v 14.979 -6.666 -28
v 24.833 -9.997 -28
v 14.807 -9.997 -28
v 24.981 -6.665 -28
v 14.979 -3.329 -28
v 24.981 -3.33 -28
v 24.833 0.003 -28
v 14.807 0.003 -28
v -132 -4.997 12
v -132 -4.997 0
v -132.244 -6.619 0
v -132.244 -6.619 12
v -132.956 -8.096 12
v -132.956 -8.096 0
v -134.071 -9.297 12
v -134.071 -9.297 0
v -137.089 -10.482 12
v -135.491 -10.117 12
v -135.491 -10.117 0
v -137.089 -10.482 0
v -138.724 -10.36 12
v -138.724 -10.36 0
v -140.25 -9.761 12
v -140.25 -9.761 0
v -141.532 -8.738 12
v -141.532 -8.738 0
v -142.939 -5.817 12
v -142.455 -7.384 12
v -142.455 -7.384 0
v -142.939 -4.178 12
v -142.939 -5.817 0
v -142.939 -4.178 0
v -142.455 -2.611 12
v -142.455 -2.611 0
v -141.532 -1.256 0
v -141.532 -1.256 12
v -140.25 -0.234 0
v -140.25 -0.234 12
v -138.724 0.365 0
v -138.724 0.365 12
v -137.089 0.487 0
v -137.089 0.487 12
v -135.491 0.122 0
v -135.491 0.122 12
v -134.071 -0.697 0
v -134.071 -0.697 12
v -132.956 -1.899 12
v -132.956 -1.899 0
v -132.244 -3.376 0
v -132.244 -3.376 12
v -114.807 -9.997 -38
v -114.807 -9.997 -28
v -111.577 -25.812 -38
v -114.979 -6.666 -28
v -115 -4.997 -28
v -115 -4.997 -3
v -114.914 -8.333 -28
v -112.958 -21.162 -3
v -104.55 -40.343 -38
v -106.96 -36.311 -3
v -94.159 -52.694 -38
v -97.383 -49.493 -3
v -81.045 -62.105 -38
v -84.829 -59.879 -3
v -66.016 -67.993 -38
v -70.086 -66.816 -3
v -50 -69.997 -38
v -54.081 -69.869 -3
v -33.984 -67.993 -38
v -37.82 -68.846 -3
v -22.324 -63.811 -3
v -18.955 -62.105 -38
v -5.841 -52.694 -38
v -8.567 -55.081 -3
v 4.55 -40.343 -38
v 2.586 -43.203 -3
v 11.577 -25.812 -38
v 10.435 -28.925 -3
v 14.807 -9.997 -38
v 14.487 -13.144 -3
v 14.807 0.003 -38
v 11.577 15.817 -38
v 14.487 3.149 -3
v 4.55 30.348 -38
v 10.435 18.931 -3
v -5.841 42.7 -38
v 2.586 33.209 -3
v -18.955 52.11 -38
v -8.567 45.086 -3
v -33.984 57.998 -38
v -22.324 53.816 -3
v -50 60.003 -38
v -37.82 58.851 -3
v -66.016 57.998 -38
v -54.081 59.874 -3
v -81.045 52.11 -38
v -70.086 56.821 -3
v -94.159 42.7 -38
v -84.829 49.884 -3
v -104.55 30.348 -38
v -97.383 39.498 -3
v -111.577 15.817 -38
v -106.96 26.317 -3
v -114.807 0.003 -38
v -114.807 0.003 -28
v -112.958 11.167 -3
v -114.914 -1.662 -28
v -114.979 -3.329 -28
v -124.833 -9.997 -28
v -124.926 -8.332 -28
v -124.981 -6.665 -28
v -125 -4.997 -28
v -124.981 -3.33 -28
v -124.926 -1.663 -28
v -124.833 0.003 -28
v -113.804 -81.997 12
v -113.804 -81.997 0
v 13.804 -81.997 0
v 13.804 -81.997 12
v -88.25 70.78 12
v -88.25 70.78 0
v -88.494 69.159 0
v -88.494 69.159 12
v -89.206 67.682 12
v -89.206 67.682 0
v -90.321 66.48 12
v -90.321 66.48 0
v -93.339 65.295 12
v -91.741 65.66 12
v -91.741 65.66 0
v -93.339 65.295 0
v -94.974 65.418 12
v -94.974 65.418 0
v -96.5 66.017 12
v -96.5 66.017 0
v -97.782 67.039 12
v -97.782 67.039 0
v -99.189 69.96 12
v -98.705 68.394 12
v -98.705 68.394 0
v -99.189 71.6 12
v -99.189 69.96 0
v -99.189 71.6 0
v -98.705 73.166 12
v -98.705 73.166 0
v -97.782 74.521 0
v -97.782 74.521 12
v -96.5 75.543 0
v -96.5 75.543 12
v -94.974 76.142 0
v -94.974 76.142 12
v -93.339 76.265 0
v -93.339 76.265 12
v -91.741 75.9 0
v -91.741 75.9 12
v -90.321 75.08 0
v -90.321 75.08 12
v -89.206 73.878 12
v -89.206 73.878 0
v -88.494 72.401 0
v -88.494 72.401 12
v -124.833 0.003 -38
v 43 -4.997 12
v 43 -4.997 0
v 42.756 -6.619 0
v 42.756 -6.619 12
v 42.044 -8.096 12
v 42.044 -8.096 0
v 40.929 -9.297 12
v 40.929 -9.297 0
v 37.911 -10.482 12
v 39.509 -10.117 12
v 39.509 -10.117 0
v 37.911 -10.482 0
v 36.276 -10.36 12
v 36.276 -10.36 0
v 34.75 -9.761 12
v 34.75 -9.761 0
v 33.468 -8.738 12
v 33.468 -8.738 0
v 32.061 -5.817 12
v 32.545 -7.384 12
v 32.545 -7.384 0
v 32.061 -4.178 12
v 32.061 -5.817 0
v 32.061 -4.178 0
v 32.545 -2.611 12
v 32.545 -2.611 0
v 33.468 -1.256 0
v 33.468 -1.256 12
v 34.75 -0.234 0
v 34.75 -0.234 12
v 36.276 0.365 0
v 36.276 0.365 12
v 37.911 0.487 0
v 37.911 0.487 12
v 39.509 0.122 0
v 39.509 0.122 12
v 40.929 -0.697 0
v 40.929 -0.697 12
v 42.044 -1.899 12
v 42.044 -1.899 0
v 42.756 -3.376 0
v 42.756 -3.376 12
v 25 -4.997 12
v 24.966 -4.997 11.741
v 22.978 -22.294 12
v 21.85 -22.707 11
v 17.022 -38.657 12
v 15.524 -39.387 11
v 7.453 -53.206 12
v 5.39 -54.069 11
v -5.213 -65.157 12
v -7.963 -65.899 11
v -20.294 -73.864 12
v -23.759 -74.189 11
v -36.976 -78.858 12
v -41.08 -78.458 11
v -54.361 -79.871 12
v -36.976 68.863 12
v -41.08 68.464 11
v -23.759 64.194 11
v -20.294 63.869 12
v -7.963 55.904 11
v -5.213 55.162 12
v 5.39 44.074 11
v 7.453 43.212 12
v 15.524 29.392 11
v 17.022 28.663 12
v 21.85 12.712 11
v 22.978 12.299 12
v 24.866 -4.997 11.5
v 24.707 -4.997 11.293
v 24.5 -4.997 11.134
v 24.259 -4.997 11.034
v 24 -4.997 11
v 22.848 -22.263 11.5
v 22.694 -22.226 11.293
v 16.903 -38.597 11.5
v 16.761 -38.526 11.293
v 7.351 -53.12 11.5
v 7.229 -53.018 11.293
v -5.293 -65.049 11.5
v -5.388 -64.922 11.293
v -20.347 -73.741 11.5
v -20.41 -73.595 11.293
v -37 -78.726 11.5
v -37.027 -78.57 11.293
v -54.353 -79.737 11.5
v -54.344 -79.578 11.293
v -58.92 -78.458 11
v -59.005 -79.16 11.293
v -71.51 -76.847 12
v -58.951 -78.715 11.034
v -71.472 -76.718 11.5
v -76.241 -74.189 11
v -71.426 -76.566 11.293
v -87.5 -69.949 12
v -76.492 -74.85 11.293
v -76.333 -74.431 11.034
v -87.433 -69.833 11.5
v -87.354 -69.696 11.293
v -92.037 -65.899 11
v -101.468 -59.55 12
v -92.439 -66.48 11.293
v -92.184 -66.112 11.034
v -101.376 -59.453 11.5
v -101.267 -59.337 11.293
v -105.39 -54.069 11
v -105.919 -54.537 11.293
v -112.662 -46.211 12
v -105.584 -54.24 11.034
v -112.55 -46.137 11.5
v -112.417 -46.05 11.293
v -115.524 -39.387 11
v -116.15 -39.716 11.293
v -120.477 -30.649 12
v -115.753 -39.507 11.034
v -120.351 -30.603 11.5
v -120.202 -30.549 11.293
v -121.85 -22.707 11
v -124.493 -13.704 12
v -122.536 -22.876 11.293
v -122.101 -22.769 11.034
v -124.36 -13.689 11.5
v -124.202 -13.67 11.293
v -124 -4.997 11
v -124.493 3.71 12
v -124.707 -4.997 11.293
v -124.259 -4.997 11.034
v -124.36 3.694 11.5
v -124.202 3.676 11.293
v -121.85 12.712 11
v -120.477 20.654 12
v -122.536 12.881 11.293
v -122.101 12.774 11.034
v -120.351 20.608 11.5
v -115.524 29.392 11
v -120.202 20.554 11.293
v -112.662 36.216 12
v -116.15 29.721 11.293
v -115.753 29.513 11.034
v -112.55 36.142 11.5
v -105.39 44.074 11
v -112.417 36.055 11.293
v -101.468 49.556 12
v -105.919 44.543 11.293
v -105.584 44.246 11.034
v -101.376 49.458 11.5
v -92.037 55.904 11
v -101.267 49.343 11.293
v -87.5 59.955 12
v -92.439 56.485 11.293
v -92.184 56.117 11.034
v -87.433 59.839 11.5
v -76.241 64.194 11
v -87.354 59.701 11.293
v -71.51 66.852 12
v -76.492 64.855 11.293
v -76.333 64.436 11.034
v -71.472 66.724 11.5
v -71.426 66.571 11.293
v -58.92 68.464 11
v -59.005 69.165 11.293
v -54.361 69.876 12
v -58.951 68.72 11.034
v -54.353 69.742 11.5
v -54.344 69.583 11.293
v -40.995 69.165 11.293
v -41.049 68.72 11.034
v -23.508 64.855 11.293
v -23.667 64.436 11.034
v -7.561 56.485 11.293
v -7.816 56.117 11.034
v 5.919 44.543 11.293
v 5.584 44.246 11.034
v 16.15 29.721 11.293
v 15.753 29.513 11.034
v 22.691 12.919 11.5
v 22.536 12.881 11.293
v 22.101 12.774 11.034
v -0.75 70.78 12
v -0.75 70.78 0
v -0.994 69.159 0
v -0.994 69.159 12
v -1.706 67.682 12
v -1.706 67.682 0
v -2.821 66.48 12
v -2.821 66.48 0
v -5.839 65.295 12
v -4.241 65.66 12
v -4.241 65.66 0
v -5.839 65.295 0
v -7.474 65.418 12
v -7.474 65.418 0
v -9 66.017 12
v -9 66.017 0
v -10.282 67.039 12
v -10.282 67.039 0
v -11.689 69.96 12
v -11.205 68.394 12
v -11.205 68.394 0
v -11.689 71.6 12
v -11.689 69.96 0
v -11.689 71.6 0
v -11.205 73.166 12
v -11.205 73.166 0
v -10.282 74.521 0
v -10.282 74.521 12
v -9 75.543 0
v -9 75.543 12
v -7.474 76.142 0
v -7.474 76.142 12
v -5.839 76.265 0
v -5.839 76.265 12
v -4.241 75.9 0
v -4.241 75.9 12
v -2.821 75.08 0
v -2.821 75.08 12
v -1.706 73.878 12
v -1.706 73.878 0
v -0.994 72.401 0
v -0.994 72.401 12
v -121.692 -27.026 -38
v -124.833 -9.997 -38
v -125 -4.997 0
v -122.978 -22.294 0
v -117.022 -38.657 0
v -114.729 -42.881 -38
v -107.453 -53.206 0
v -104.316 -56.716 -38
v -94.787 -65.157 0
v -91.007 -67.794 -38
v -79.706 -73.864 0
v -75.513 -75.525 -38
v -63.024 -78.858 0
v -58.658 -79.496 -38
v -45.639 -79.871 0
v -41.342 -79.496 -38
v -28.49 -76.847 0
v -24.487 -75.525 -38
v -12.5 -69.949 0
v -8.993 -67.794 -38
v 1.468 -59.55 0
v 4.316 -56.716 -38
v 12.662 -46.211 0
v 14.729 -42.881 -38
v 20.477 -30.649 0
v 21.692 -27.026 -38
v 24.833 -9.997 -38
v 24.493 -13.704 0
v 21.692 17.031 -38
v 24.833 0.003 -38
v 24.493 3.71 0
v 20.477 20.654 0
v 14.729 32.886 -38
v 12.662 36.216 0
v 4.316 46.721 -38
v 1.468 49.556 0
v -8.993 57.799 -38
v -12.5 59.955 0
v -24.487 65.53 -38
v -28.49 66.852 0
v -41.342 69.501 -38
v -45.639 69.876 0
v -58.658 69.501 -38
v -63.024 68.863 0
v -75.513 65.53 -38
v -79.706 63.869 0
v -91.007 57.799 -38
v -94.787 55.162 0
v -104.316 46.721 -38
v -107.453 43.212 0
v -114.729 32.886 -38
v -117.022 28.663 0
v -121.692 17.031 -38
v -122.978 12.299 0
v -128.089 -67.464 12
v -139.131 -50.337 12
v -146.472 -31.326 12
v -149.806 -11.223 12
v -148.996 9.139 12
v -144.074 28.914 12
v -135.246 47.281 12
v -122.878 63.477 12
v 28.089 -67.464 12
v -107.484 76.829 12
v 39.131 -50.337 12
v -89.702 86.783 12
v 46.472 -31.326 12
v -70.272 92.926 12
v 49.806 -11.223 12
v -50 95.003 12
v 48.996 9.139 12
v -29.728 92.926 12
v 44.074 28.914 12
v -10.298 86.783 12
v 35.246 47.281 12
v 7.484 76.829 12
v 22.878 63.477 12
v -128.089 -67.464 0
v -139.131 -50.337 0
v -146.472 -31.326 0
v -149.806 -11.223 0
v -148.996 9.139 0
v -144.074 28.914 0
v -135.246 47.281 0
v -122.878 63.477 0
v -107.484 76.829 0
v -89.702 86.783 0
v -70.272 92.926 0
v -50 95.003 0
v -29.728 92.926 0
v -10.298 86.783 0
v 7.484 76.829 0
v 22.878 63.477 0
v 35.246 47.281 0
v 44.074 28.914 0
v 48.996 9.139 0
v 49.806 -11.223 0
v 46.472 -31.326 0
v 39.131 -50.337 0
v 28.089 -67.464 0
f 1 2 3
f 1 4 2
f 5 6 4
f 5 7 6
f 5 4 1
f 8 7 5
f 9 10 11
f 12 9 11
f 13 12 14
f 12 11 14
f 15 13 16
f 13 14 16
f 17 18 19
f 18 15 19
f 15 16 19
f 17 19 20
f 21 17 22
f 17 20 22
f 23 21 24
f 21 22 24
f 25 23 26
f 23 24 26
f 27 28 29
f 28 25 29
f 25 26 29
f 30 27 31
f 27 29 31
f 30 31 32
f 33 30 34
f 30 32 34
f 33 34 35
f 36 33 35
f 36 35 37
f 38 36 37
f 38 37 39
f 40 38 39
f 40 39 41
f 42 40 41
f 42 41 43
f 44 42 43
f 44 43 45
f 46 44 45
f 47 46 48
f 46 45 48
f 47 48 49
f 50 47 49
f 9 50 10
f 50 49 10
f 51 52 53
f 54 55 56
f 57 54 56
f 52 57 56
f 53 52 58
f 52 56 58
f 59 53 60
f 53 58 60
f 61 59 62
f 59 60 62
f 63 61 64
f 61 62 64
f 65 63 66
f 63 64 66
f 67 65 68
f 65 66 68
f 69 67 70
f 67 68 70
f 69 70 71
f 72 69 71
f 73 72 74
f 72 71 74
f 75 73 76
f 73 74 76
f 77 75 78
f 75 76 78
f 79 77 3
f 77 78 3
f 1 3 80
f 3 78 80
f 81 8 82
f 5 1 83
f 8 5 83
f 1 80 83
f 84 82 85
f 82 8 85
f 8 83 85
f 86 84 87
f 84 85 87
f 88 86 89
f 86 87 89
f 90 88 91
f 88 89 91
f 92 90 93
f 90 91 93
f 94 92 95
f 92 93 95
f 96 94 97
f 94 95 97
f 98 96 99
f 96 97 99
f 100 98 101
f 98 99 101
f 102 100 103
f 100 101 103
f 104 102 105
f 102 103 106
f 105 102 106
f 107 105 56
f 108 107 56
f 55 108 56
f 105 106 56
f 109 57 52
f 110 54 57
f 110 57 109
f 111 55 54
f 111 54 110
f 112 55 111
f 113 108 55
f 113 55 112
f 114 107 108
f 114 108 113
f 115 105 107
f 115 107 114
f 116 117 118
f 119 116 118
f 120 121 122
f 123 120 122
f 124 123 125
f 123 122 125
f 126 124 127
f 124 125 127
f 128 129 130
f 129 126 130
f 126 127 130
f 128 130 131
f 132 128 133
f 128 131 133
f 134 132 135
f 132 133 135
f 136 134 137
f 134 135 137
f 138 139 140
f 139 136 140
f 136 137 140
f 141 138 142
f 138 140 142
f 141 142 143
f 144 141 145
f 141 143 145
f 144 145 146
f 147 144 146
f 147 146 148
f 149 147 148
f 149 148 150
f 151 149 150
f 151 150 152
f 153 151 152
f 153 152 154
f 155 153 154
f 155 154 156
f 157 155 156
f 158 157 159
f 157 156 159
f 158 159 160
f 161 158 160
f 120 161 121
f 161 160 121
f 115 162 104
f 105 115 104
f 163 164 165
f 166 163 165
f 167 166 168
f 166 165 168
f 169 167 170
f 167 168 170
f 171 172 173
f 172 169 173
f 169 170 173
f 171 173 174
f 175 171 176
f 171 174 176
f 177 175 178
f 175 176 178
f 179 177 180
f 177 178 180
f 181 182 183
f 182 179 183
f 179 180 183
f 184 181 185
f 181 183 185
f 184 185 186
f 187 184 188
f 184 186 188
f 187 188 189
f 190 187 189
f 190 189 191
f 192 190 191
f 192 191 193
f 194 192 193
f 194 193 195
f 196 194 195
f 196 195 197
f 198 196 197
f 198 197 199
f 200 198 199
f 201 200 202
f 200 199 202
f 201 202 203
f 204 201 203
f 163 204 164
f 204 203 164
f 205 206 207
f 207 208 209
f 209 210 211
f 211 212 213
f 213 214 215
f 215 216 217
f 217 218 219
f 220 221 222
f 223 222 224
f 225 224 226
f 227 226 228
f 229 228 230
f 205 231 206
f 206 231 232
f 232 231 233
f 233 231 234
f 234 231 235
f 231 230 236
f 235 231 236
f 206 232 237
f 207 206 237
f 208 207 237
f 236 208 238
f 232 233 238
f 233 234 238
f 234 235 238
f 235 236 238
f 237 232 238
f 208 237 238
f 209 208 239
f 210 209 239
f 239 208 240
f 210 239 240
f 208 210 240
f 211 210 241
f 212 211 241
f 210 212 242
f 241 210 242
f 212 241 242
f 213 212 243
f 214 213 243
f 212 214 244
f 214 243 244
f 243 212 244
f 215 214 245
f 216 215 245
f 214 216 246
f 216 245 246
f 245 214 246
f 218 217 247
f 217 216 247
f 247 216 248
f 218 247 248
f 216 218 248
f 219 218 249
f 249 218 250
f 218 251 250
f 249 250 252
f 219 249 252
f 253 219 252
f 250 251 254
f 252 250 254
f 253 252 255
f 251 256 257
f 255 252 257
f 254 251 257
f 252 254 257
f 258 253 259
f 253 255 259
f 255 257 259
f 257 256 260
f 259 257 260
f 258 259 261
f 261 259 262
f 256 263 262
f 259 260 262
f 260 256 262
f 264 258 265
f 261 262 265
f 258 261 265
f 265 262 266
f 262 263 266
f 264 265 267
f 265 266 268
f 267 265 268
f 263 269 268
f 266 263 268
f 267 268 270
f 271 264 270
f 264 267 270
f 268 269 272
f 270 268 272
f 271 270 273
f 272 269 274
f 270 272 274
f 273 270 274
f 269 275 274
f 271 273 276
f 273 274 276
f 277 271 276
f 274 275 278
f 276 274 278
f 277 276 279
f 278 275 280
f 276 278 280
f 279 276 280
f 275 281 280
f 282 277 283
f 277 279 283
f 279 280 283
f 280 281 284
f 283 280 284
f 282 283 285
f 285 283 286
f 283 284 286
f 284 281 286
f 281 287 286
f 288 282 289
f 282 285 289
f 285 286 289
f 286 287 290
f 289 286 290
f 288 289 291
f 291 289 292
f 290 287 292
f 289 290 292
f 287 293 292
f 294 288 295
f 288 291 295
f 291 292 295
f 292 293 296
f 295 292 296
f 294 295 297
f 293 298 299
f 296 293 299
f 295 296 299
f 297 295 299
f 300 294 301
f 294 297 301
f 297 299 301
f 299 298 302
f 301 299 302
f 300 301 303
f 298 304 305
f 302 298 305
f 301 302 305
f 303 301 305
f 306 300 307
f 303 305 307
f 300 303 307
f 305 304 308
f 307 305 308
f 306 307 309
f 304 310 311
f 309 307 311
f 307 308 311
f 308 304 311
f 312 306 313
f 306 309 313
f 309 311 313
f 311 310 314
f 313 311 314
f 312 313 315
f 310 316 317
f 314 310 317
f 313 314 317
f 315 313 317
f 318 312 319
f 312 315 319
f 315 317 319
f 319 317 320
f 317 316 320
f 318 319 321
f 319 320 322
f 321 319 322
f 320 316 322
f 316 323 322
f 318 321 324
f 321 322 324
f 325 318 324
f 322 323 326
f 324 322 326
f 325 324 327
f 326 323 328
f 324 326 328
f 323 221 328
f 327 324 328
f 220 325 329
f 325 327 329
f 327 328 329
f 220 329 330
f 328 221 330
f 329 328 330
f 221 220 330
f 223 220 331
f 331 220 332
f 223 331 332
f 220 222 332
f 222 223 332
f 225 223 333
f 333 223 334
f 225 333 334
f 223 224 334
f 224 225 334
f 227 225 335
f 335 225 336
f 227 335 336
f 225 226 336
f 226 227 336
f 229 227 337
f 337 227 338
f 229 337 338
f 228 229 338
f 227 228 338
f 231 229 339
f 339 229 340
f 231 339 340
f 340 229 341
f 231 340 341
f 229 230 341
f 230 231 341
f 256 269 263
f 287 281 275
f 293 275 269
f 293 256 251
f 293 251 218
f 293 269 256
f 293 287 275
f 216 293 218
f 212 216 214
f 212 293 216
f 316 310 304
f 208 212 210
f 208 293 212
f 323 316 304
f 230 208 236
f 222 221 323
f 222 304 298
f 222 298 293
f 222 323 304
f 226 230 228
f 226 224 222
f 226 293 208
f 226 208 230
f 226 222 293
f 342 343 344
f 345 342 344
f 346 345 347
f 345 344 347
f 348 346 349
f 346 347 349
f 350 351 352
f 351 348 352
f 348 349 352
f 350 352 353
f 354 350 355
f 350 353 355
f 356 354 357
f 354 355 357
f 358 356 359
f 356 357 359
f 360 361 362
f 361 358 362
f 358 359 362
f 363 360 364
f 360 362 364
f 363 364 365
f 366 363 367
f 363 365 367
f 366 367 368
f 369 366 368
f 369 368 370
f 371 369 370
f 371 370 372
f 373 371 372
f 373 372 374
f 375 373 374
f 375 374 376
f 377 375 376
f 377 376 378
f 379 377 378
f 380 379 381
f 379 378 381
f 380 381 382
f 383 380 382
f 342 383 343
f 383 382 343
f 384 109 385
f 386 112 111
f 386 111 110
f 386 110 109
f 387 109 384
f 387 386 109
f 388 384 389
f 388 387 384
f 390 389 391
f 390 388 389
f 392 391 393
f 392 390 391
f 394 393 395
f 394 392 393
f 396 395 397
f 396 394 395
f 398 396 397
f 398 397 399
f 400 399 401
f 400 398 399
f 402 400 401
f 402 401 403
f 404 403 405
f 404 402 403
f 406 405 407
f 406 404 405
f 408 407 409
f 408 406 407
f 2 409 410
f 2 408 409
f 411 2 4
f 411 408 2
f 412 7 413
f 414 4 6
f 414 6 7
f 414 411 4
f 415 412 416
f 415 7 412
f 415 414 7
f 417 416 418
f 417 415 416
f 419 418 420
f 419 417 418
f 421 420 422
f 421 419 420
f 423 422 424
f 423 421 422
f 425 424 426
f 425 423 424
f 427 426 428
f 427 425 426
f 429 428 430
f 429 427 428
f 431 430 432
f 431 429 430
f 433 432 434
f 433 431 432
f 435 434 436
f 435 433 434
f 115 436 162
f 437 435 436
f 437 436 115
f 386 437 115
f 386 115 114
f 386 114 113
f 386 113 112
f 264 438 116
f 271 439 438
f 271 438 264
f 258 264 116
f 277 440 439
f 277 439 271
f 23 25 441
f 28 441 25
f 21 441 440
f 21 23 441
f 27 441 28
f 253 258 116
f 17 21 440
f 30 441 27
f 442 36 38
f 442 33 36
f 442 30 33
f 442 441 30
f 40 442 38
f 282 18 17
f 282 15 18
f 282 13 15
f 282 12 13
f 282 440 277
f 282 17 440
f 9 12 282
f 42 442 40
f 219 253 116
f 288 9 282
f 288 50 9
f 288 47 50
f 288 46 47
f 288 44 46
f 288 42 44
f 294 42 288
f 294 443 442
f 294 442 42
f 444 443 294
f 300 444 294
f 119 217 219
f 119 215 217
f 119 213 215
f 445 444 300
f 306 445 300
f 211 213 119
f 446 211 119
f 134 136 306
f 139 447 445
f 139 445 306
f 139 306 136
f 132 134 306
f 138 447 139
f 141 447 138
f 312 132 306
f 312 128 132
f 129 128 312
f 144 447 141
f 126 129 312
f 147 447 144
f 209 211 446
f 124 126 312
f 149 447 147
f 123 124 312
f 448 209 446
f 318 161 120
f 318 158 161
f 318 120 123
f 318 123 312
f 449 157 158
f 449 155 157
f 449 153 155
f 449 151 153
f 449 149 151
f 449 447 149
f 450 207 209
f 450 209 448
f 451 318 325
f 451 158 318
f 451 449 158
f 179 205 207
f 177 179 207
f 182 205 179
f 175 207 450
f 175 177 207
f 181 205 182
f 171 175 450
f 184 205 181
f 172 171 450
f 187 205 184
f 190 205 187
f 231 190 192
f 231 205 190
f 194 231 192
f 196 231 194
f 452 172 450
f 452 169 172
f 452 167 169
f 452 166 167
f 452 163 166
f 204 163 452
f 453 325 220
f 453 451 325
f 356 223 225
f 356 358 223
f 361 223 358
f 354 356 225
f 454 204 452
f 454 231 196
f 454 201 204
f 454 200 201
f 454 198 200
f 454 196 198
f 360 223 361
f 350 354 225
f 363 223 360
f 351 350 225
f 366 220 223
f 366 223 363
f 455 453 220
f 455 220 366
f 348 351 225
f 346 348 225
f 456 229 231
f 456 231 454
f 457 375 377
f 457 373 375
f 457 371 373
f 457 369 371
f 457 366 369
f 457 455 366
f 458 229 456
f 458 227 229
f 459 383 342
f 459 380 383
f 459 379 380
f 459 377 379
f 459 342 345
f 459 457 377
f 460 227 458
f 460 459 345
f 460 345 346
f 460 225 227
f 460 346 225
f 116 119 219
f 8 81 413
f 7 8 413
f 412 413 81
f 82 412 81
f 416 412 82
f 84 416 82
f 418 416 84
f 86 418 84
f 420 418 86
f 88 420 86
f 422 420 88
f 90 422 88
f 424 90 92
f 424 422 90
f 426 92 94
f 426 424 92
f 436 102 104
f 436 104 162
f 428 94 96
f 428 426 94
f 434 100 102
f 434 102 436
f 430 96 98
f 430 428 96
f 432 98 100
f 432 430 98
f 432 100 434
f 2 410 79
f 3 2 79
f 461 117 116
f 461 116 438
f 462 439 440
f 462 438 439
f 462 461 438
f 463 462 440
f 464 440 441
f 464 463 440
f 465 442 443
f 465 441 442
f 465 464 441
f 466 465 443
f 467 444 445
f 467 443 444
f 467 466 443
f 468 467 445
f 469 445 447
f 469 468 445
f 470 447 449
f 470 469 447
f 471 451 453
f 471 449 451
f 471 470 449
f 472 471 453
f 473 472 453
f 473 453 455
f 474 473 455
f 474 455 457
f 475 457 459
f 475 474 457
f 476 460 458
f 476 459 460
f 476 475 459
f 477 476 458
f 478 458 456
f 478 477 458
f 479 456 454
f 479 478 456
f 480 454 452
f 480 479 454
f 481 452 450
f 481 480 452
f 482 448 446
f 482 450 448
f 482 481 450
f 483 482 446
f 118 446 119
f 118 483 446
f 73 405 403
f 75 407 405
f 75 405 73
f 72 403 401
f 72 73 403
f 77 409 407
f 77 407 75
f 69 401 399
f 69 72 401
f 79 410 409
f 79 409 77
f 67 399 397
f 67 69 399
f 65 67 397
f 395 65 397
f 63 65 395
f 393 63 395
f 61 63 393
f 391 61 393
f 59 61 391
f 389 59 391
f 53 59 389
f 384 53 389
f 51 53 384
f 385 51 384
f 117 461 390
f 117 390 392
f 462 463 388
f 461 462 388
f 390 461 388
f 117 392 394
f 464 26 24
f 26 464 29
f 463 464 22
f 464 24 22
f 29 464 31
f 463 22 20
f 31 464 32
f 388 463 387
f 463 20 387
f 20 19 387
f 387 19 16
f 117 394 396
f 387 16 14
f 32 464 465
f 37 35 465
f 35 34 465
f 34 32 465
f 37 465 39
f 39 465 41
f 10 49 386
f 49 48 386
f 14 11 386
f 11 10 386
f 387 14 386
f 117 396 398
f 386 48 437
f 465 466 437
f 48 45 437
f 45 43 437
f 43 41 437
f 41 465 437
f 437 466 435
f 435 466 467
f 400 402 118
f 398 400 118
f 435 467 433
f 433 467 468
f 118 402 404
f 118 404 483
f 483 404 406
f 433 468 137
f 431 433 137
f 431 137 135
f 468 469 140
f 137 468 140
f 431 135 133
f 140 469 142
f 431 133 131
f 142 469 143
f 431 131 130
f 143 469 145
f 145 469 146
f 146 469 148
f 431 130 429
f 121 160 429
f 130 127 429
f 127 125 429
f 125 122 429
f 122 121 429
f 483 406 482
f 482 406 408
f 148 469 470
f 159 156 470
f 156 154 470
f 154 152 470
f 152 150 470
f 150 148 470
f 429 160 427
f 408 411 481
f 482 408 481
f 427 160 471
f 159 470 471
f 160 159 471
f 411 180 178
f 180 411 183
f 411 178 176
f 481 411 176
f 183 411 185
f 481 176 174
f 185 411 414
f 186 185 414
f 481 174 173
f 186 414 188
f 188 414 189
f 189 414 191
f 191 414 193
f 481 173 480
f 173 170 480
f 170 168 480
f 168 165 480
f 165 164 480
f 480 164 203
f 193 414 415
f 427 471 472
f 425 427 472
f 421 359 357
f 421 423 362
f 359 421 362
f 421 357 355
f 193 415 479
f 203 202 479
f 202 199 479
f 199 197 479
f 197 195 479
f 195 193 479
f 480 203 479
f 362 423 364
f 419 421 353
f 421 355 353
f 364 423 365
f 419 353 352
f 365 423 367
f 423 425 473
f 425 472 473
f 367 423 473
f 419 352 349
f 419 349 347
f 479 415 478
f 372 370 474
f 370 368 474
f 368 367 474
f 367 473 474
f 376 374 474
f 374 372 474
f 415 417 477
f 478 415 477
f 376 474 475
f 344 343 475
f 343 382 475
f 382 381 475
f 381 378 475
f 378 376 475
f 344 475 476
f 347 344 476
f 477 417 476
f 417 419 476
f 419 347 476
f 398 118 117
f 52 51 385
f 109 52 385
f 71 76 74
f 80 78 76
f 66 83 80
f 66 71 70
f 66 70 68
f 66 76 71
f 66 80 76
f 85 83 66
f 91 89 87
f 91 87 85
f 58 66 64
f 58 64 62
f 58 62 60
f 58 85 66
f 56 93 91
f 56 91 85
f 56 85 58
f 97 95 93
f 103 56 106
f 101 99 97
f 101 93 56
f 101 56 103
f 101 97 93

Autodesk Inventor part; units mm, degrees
ref_plane "YZ Plane" through (0, 0, 0) normal (1, 0, 0) x (0, 1, 0)
ref_plane "XZ Plane" through (0, 0, 0) normal (0, 1, 0) x (-1, 0, 0)
ref_plane "工作平面1" through (0, 0, 0) normal (0, 0, 1) x (1, 0, 0)
sketch "草图1" plane through (0, 0, 0) normal (0, 0, 1) x (1, 0, 0)
  arc A0 (9.993, -85.0026) -> (-35, 93.8712) centre (-50, -4.9974) ccw construction
  arc A1 (-50, -79.9974) -> (-50, 70.0026) centre (-50, -4.9974) ccw construction
  line L0 (-50, -79.9974) -> (-50, -85.0026) construction
  line L1 (-35, -85.0026) -> (-50, -85.0026) construction
  line L2 (-35, -95.0026) -> (-35, -85.0026) construction
  line L3 (9.993, -95.0026) -> (-35, -95.0026) construction
  line L4 (9.993, -95.0026) -> (9.993, -85.0026) construction
  arc A2 (9.993, -85.0026) -> (-35, 93.8712) centre (-50, -4.9974) ccw construction
  line L5 (-35, 93.8712) -> (-35, 95.0026) construction
  line L6 (-35, 95.0026) -> (-50, 95.0026) construction
  line L7 (-50, 95.0026) -> (-50, 70.0026) construction
  arc A3 (13.8044, -81.9974) -> (-113.8044, -81.9974) centre (-50, -4.9974) ccw
  line L8 (-113.8044, -81.9974) -> (13.8044, -81.9974)
  circle A4 centre (-50, -4.9974) radius 87.5 construction
  line L9 (-162.5015, -4.9974) -> (70.6652, -4.9974) construction
  circle A5 centre (-137.5, -4.9974) radius 5.5
  circle A6 centre (-93.75, -80.7746) radius 5.5 construction
  circle A7 centre (-6.25, -80.7746) radius 5.5 construction
  circle A8 centre (37.5, -4.9974) radius 5.5
  circle A9 centre (-6.25, 70.7799) radius 5.5
  circle A10 centre (-93.75, 70.7799) radius 5.5
  point P0 (0, 0)
  point P1 (-50, -81.9974)
  dimension "d1" = 175
  dimension "d0" = 2
  dimension "d2" = 11
  dimension "d5" = 360
extrude "拉伸1" add sketch "草图1" along normal blind 12
sketch "草图2" plane through (0, 0, 0) normal (0, 0, -1) x (-1, 0, 0)
  arc A0 (113.8044, -81.9974) -> (-13.8044, -81.9974) centre (50, -4.9974) ccw construction
  circle A1 centre (50, -4.9974) radius 75
  circle A2 centre (50, -4.9974) radius 65
  point P0 (0, 0)
  dimension "d9" = 150
  dimension "d10" = 10
extrude "拉伸2" add sketch "草图2" along normal blind 38
sketch "草图3" plane through (0, 0, 12) normal (0, 0, 1) x (1, 0, 0)
  arc A0 (13.8044, -81.9974) -> (-113.8044, -81.9974) centre (-50, -4.9974) ccw construction
  circle A1 centre (-50, -4.9974) radius 75
  circle A2 centre (-137.5, -4.9974) radius 5.5 construction
  point P0 (0, 0)
  dimension "d13" = 150
extrude "拉伸3" cut sketch "草图3" against normal blind 1
fillet "圆角1" radius 1 1 edges at (-125, -4.9974, 11)
sketch "草图4" plane through (-50, -4.9974, -38) normal (0, 0, -1) x (-1, 0, 0)
  line L0 (100, 5) -> (-100, 5)
  line L1 (-100, 5) -> (-100, -5)
  line L2 (-100, -5) -> (100, -5)
  line L3 (100, -5) -> (100, 5)
  circle A0 centre (0, 0) radius 65 construction
  point P0 (-50, 4.9974)
  point P1 (100, 0)
  point P2 (0, -5)
  dimension "d17" = 10
  dimension "d18" = 200
extrude "拉伸4" cut sketch "草图4" against normal blind 10
sketch "草图5" plane through (-50, -4.9974, 0) normal (0, 0, -1) x (-1, 0, 0)
  circle A0 centre (0, 0) radius 65 projected
  point P0 (-50, 4.9974)
extrude "拉伸5" add sketch "草图5" along normal blind 3
properties part number "轴承端盖3"
